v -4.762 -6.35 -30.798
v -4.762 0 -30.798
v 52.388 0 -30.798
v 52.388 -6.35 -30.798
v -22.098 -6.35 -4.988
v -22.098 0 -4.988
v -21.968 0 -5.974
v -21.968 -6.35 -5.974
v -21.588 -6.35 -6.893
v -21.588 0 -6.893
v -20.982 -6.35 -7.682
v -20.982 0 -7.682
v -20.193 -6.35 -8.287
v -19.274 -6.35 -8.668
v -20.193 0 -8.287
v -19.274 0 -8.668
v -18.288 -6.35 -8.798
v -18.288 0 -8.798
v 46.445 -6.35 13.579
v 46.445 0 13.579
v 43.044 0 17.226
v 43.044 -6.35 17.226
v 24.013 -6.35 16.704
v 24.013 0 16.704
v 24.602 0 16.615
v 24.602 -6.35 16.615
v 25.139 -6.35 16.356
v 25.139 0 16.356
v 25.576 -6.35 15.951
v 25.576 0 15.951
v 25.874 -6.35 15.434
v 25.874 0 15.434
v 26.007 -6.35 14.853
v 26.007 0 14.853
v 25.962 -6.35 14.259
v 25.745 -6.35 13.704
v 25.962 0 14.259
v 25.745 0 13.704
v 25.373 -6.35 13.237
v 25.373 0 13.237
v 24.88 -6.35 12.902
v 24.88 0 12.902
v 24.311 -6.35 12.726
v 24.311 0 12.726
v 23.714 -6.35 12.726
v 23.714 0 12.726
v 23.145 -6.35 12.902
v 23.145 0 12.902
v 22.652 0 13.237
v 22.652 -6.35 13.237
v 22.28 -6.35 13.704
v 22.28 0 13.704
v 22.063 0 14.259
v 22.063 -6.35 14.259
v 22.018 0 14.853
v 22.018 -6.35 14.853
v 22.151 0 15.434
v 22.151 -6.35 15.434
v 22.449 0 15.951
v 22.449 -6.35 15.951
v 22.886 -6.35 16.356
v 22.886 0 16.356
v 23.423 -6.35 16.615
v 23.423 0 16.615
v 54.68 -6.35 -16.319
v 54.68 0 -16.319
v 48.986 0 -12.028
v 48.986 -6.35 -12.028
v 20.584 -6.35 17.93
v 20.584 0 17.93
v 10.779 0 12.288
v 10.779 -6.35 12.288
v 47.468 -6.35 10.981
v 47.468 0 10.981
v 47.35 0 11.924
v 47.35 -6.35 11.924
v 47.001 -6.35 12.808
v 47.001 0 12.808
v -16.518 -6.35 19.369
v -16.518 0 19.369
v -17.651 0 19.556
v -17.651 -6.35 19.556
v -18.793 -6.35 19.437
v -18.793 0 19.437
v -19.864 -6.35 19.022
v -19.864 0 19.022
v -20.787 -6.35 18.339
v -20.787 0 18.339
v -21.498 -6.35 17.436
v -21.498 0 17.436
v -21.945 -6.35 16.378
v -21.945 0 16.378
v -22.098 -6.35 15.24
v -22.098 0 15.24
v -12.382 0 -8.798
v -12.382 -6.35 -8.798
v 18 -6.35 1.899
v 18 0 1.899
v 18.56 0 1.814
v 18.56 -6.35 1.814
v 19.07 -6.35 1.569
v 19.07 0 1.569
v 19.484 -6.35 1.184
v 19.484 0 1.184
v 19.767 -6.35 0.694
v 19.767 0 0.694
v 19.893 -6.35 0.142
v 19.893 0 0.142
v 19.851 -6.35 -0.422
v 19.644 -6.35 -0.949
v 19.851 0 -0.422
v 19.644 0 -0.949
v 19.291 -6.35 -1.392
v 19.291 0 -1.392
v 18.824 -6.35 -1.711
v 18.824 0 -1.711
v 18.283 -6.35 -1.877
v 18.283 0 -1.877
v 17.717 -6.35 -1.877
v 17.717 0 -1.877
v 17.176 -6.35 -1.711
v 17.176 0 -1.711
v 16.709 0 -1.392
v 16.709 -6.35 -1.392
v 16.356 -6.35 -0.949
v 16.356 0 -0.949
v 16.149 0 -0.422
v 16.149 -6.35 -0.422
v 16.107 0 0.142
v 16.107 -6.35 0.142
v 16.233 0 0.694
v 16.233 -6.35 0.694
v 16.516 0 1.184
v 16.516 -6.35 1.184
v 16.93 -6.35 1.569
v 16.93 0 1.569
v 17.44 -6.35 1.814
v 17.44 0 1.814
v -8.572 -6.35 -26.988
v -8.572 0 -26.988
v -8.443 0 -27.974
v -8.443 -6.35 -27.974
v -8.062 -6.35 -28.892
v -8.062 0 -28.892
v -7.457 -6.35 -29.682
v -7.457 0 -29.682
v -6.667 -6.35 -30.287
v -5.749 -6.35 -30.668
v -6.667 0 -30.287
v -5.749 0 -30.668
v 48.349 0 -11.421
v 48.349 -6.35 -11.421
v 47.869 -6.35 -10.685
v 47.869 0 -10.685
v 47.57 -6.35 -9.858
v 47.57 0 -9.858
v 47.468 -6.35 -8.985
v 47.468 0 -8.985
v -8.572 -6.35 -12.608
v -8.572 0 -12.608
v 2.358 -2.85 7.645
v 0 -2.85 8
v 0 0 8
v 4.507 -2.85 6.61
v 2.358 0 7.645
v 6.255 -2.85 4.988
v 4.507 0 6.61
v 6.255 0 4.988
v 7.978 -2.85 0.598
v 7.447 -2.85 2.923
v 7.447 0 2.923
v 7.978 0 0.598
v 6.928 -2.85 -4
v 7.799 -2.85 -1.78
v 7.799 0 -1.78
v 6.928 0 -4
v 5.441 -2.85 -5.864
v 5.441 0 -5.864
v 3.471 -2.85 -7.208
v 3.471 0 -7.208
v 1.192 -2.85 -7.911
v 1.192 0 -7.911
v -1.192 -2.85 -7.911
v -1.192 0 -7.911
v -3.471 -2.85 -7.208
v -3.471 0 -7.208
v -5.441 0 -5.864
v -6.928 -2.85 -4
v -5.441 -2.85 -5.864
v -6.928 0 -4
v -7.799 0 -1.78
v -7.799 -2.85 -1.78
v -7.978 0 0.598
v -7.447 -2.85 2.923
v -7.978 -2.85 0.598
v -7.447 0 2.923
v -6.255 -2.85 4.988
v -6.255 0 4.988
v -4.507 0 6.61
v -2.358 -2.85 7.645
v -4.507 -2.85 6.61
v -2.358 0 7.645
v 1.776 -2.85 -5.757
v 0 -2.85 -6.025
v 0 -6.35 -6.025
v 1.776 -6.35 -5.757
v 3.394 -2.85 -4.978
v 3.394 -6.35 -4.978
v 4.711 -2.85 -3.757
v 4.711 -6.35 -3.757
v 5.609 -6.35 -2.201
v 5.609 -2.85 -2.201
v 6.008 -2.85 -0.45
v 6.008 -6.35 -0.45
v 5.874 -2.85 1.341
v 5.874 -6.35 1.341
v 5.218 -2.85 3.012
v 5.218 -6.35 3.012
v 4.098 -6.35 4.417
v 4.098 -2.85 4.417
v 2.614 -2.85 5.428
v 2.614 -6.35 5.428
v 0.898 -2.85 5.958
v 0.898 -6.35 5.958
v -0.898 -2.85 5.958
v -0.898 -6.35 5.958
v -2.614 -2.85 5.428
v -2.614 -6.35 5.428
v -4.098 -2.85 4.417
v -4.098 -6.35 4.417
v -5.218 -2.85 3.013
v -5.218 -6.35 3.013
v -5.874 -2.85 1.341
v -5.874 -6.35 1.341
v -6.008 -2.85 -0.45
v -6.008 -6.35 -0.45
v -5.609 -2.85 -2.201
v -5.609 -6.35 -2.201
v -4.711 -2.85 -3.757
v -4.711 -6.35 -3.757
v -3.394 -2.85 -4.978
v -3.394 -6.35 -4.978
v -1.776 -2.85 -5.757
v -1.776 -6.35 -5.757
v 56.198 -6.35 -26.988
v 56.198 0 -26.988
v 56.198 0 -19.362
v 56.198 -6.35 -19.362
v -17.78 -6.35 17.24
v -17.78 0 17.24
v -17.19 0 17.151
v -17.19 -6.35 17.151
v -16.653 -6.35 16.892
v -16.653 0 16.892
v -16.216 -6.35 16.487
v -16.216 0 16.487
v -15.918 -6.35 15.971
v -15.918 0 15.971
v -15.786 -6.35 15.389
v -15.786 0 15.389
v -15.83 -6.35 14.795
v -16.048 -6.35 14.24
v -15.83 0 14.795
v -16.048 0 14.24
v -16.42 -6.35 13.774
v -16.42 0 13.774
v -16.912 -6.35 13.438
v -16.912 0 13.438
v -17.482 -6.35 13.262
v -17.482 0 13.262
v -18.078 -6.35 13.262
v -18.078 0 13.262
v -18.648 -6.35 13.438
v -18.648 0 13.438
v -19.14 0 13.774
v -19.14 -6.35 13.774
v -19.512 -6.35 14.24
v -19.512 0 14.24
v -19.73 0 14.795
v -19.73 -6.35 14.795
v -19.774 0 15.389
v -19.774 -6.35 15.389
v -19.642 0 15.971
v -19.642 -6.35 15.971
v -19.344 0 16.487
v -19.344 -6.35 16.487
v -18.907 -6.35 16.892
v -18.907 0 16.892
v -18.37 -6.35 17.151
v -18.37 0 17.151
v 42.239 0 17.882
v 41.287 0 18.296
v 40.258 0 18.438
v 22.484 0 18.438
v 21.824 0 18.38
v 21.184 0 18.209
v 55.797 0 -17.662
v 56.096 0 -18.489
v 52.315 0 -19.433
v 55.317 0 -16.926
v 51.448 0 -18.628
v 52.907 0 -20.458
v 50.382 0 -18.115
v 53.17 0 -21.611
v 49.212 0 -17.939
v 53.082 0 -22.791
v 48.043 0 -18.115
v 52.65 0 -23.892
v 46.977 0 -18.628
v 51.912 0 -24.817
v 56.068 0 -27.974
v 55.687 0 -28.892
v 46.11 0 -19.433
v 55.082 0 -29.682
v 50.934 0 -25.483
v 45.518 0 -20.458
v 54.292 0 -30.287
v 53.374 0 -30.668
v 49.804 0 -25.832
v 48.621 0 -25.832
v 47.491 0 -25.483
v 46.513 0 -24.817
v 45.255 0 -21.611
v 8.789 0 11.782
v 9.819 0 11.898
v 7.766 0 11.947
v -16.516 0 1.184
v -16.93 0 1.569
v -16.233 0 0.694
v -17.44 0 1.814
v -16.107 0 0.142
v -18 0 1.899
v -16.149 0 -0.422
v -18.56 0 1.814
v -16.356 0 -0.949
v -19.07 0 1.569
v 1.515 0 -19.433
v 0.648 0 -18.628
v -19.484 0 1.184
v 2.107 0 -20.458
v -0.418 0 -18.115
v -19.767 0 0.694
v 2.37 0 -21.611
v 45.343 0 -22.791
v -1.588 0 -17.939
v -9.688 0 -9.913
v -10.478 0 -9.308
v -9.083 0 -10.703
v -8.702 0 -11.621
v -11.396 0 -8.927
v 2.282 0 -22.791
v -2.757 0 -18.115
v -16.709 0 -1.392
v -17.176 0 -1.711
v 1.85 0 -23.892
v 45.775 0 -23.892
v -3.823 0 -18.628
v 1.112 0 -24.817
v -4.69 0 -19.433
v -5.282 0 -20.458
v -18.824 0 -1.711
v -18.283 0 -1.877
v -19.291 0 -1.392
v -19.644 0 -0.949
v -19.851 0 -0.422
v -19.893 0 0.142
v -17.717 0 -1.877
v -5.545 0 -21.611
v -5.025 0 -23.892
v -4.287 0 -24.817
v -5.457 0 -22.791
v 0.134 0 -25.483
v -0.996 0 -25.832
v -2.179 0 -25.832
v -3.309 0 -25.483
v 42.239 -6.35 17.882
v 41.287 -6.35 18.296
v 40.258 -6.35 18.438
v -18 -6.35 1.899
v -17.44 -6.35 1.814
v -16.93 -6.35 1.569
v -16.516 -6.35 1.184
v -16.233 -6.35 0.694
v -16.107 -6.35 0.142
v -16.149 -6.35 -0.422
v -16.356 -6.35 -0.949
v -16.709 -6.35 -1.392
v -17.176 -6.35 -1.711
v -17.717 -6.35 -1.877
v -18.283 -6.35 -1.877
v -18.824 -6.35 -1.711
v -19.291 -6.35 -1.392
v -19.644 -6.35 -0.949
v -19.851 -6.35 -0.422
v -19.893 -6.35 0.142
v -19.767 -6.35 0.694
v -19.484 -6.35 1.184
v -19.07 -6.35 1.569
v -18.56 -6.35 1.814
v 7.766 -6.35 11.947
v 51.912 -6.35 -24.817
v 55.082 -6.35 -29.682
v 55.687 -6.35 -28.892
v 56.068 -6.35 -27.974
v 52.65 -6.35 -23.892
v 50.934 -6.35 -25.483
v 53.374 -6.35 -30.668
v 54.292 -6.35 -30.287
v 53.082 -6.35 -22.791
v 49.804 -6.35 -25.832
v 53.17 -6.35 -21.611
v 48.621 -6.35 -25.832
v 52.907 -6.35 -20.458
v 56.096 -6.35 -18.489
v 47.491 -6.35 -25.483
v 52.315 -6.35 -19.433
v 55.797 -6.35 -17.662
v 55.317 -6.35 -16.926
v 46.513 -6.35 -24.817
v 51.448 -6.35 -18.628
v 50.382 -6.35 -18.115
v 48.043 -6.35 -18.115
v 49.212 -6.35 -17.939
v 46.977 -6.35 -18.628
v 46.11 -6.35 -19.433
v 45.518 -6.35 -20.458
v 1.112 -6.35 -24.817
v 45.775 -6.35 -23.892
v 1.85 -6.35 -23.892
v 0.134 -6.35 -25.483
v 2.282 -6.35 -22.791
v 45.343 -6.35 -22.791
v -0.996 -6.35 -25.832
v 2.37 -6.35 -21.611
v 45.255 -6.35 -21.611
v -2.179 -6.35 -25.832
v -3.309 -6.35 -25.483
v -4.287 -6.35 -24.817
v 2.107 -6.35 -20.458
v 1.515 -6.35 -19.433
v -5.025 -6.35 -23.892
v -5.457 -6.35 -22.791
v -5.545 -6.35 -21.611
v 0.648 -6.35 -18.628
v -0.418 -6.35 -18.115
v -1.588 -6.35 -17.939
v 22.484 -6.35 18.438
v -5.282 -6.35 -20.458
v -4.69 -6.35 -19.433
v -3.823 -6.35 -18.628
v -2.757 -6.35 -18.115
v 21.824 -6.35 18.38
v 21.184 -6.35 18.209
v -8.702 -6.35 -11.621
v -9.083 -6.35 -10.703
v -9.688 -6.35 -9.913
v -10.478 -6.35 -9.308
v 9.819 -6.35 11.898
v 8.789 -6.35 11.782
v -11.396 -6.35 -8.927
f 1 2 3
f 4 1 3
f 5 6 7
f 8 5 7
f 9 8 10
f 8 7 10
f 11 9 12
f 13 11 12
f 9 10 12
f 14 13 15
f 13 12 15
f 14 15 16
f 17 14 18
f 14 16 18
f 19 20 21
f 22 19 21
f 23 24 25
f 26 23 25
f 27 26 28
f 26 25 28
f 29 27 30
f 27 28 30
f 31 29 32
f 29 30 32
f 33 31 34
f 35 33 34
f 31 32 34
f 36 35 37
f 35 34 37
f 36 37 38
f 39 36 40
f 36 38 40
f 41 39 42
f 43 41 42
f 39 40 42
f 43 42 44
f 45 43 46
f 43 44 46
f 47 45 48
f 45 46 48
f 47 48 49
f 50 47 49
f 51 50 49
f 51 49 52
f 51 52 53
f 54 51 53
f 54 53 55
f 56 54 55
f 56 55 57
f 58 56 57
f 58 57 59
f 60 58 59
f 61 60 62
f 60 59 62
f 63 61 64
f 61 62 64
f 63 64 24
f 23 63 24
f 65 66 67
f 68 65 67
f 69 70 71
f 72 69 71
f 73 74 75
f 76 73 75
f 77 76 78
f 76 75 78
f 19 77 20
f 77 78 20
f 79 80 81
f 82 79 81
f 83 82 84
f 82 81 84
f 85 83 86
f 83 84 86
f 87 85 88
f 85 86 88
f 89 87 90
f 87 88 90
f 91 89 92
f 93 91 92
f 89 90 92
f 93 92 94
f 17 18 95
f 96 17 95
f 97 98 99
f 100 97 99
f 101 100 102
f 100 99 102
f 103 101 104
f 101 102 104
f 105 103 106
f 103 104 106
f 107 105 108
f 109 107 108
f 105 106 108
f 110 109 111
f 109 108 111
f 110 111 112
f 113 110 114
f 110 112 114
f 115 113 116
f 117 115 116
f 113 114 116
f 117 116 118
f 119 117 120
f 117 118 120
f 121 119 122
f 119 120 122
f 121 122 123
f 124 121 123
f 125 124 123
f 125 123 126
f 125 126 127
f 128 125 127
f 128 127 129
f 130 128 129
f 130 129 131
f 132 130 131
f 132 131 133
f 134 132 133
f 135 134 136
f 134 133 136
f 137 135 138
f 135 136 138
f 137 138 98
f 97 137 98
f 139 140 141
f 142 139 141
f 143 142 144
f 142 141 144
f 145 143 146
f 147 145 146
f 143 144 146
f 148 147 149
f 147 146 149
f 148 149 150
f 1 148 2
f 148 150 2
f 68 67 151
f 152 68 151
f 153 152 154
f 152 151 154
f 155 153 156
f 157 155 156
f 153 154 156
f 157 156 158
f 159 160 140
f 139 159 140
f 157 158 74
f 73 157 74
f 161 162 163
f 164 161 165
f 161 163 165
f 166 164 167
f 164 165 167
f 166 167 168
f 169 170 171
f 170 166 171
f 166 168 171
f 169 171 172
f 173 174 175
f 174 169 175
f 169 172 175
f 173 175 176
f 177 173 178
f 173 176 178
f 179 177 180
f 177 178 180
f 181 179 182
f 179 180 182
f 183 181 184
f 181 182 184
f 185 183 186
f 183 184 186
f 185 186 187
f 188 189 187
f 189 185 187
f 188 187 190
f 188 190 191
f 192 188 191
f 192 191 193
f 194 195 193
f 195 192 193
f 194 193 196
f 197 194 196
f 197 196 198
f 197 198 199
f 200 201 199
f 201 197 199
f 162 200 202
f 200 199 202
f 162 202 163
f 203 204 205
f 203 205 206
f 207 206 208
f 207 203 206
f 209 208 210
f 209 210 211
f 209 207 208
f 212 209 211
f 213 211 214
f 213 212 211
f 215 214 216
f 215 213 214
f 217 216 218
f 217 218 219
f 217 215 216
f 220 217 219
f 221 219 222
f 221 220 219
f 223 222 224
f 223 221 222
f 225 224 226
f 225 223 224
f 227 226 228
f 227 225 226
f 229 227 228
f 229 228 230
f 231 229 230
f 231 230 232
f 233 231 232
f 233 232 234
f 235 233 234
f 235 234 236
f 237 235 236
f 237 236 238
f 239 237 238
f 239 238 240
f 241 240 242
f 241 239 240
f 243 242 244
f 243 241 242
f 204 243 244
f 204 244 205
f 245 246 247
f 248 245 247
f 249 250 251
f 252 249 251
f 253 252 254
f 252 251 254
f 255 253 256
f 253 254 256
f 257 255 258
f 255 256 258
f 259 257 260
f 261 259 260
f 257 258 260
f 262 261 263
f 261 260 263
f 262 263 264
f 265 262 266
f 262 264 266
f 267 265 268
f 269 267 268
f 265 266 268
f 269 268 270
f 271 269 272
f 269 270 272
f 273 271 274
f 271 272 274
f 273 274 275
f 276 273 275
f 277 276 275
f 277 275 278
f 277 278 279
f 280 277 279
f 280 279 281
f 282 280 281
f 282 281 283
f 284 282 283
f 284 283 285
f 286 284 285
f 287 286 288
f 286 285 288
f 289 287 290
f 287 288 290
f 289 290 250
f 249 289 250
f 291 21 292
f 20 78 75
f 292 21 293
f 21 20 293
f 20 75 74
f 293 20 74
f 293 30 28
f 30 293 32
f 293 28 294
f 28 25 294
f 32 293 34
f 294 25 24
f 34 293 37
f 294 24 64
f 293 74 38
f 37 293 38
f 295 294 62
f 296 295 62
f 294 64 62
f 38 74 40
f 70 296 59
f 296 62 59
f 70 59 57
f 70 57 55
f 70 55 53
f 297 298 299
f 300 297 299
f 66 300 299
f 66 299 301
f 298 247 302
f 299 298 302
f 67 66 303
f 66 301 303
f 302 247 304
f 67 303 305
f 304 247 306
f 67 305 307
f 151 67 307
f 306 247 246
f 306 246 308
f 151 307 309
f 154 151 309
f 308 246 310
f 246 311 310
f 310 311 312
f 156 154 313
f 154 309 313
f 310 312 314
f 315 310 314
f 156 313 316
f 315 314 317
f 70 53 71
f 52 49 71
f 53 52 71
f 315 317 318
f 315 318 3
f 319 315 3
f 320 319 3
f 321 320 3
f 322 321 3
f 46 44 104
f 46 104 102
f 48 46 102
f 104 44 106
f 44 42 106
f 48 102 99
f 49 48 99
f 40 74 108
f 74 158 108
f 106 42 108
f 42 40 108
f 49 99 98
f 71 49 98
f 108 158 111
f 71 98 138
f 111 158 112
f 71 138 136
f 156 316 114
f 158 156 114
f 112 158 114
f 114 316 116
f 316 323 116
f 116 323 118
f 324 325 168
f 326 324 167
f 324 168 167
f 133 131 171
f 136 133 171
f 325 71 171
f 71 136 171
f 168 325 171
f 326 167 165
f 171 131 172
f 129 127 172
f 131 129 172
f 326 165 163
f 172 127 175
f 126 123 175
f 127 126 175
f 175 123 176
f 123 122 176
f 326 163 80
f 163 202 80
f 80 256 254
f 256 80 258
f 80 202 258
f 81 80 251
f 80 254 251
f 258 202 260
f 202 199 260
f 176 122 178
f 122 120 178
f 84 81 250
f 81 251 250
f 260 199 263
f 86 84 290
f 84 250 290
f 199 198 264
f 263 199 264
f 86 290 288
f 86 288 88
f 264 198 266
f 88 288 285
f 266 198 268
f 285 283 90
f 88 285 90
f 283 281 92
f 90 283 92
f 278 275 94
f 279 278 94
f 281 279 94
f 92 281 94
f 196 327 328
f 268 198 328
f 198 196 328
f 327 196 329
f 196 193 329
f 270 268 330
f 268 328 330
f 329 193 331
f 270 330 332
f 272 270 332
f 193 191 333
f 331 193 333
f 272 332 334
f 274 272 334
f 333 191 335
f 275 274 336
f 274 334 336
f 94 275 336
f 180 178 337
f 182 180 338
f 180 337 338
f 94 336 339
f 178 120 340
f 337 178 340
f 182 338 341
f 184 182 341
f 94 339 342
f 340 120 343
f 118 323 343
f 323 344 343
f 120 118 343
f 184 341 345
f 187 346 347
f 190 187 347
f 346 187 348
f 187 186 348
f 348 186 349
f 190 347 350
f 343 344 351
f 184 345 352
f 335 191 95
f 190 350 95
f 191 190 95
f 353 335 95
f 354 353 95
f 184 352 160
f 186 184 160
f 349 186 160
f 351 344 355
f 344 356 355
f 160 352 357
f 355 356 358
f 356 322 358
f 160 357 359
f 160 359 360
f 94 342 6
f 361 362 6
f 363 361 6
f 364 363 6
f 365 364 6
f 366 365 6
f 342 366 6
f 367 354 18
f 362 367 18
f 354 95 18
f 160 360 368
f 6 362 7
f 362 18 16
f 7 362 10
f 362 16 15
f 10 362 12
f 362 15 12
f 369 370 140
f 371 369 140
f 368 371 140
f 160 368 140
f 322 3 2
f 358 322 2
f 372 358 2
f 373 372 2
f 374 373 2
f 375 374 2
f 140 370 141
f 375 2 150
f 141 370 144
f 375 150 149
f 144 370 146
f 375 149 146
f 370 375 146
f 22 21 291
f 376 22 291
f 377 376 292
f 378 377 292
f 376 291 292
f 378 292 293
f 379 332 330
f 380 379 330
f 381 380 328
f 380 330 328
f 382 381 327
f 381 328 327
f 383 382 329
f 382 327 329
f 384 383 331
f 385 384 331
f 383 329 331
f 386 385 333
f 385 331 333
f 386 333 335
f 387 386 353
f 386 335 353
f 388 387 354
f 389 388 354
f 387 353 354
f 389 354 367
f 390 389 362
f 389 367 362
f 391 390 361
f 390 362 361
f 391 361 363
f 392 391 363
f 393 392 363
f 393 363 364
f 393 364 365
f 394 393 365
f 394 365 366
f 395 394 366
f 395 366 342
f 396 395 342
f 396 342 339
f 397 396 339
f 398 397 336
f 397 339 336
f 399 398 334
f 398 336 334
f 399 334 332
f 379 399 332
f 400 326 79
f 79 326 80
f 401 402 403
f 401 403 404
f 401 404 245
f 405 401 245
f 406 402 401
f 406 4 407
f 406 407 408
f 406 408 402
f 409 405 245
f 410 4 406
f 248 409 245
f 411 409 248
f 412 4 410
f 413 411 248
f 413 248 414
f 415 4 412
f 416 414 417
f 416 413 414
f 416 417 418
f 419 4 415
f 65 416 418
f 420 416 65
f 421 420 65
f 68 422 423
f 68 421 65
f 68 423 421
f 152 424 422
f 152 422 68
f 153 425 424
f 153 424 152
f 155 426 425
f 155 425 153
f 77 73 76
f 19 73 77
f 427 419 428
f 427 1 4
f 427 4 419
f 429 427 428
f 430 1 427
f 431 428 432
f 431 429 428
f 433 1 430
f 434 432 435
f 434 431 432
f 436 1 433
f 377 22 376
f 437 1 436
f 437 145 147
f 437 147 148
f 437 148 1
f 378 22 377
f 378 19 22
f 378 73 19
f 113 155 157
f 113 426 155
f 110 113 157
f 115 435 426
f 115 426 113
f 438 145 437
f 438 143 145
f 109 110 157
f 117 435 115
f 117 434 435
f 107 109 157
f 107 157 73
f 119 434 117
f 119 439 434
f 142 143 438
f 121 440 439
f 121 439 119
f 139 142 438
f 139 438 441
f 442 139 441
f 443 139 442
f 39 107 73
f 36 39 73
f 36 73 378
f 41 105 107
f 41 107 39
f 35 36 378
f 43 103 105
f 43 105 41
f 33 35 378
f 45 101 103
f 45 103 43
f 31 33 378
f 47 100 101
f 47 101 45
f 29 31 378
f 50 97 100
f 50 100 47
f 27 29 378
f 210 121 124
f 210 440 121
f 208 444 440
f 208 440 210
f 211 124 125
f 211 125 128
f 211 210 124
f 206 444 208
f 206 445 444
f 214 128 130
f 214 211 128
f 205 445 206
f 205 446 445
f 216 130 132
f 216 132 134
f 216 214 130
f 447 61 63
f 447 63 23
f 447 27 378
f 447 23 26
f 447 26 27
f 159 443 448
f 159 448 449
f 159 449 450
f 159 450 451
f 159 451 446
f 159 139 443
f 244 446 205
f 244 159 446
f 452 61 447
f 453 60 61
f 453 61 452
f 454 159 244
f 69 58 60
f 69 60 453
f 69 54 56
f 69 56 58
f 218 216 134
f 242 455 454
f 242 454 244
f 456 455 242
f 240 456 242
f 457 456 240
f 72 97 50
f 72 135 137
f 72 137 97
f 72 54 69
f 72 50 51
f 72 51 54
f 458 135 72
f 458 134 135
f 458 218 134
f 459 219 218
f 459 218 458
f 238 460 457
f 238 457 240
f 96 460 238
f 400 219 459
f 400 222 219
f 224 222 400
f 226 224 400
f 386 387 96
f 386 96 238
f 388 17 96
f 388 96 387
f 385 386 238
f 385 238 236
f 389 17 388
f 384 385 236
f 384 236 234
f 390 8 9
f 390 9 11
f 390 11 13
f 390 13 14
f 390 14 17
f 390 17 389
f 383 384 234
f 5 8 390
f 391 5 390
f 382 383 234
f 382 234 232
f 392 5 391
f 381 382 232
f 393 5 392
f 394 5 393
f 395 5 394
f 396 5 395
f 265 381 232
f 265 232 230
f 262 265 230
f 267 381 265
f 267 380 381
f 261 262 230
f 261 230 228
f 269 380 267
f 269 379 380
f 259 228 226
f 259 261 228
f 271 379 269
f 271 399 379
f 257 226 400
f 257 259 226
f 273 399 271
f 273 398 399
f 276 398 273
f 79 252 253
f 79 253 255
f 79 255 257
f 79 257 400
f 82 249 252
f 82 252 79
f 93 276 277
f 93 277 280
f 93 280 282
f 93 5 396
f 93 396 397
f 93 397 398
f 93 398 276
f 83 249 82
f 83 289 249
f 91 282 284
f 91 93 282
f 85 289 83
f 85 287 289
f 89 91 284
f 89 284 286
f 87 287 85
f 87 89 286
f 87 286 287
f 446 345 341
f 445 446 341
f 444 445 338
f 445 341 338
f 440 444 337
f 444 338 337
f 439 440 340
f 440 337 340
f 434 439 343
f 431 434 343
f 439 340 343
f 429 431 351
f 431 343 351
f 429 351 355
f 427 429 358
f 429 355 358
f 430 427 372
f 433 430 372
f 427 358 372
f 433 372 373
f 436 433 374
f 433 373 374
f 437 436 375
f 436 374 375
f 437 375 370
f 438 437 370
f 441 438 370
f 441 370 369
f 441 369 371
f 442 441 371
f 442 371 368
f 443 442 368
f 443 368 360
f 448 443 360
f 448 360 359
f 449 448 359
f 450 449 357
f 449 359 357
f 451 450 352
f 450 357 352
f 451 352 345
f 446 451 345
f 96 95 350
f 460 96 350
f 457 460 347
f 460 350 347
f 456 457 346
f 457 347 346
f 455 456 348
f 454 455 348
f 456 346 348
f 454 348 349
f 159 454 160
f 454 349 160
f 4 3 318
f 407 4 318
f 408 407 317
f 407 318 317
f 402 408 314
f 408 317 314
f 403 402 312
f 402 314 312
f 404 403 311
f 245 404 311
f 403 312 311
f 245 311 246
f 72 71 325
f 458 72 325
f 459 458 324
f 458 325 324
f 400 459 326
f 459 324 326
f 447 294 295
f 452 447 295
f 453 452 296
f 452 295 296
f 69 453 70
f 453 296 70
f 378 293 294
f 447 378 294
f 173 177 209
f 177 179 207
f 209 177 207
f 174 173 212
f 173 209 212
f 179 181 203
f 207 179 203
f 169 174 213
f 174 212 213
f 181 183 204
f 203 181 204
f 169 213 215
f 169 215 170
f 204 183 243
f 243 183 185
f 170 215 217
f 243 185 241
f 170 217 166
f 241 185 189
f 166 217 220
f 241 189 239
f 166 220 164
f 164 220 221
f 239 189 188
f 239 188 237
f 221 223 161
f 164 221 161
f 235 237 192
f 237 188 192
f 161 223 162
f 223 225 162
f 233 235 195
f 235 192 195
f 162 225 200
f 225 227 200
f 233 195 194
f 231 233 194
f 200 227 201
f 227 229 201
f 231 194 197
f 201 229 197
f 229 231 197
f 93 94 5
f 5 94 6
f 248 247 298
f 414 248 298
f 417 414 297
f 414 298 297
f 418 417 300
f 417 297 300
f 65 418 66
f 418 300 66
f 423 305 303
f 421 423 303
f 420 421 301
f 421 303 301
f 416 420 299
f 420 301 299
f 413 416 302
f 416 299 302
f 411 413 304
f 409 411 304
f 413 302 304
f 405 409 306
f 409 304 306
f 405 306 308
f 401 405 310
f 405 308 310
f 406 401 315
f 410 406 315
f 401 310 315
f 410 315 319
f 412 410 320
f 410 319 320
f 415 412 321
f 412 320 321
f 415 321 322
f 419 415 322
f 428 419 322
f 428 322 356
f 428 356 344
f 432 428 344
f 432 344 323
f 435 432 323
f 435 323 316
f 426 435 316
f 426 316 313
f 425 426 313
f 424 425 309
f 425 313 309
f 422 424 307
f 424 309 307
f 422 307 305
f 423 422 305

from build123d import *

# Parameters (mm, degrees)
SKETCH4_R           = 8
SKETCH4_R_2         = 3.96875
SKETCH4_R_3         = 2
SKETCH4_R_4         = 1.89865
BOSS_EXTRUDE2_DEPTH = 6.35
BOSS_EXTRUDE5_START = -3.5
SKETCH31_R          = 8
SKETCH31_R_2        = 6.025
BOSS_EXTRUDE5_DEPTH = 3.5


with BuildPart() as part:
    # Sketch4 → Boss-Extrude2 (new body)
    with BuildSketch(Plane(origin=(0, 0, 0), x_dir=(1, 0, 0), z_dir=(0, 1, 0))):
        with BuildLine():
            Line((40.257702493, -18.4375), (22.483900583, -18.4375))
            ThreePointArc((22.483900583, -18.4375), (21.500464498, -18.308390309), (20.583679925, -17.929811531))
            Line((20.583679925, -17.929811531), (10.779476649, -12.288263354))
            ThreePointArc((10.779476649, -12.288263354), (9.307944036, -11.804768953), (7.765559219, -11.946980575))
            Line((7.765559219, -11.946980575), (-16.517810325, -19.369406885))
            ThreePointArc((-16.517810325, -19.369406885), (-20.348558836, -18.710969534), (-22.098, -15.24))
            Line((-22.098, -15.24), (-22.098, 4.987500122))
            ThreePointArc((-22.098, 4.987500122), (-20.982076836, 7.681576958), (-18.288, 8.797500122))
            Line((-18.288, 8.797500122), (-12.3825, 8.797500122))
            ThreePointArc((-12.3825, 8.797500122), (-9.688423164, 9.913423286), (-8.5725, 12.607500122))
            Line((-8.5725, 12.607500122), (-8.5725, 26.9875))
            ThreePointArc((-8.5725, 26.9875), (-7.456576836, 29.681576836), (-4.7625, 30.7975))
            Line((-4.7625, 30.7975), (52.3875, 30.7975))
            ThreePointArc((52.3875, 30.7975), (55.081576836, 29.681576836), (56.1975, 26.9875))
            Line((56.1975, 26.9875), (56.1975, 19.362095927))
            ThreePointArc((56.1975, 19.362095927), (55.797199918, 17.662082259), (54.680415238, 16.319294633))
            Line((54.680415238, 16.319294633), (48.985566477, 12.027918285))
            ThreePointArc((48.985566477, 12.027918285), (47.868781798, 10.685130659), (47.468481715, 8.985116992))
            Line((47.468481715, 8.985116992), (47.468481715, -10.980610773))
            ThreePointArc((47.468481715, -10.980610773), (47.203372649, -12.376980446), (46.444939319, -13.579024524))
            Line((46.444939319, -13.579024524), (43.044160097, -17.225913752))
            ThreePointArc((43.044160097, -17.225913752), (41.776936446, -18.121498883), (40.257702493, -18.4375))
        make_face()
        with Locations(Location((0, 0, 0), (0, 0, 270))):
            Circle(SKETCH4_R, mode=Mode.SUBTRACT)
        with Locations(Location((-1.5875, 21.9075, 0), (0, 0, 270))):
            Circle(SKETCH4_R_2, mode=Mode.SUBTRACT)
        with Locations(Location((49.2125, 21.9075, 0), (0, 0, 270))):
            Circle(SKETCH4_R_2, mode=Mode.SUBTRACT)
        with Locations(Location((24.012521227, -14.703599027, 0), (0, 0, 270))):
            Circle(SKETCH4_R_3, mode=Mode.SUBTRACT)
        with Locations(Location((-17.78, -15.24, 0), (0, 0, 270))):
            Circle(SKETCH4_R_3, mode=Mode.SUBTRACT)
        with Locations(Location((18.000000004, 0, 0), (0, 0, 270))):
            Circle(SKETCH4_R_4, mode=Mode.SUBTRACT)
        with Locations(Location((-18.000000004, 0, 0), (0, 0, 270))):
            Circle(SKETCH4_R_4, mode=Mode.SUBTRACT)
    extrude(amount=-BOSS_EXTRUDE2_DEPTH)

    # Sketch31 → Boss-Extrude5 (add)
    with BuildSketch(Plane.XZ.offset(6.35).offset(BOSS_EXTRUDE5_START)):
        with Locations(Location((0, 0, 0), (0, 0, 90))):
            Circle(SKETCH31_R)
        with Locations(Location((0, 0, 0), (0, 0, 270))):
            Circle(SKETCH31_R_2, mode=Mode.SUBTRACT)
    extrude(amount=BOSS_EXTRUDE5_DEPTH)


solid = part.part
